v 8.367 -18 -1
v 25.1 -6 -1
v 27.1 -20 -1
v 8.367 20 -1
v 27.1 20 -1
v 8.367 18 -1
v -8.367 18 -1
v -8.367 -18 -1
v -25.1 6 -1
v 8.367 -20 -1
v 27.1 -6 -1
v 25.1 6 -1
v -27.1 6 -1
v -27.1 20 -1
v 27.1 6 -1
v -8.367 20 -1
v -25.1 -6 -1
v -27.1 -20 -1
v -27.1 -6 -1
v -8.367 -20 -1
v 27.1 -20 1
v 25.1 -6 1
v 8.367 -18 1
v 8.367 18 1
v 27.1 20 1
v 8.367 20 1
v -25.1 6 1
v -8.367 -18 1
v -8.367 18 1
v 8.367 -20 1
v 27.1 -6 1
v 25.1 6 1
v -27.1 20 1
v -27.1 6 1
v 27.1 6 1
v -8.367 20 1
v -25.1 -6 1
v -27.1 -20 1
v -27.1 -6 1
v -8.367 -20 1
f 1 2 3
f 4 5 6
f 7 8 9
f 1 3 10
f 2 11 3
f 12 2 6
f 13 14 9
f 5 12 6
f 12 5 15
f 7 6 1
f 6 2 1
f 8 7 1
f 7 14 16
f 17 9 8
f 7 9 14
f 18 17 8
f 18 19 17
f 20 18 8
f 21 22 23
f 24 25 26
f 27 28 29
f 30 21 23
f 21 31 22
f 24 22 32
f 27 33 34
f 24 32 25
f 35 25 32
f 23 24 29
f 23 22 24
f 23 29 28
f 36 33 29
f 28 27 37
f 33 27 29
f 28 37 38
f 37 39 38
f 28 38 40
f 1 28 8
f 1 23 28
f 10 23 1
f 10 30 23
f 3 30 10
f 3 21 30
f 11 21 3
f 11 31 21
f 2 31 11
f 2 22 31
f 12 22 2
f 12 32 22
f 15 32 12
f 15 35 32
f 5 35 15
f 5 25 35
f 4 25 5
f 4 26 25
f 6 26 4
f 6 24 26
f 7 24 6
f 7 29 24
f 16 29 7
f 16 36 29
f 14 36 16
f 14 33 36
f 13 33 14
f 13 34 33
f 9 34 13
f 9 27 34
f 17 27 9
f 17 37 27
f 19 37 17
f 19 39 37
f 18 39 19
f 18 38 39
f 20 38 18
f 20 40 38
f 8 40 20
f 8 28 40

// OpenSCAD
// file: ../lib/side.scad
module side_top_bottom(inner_x,inner_y,width) {
  x = inner_x/2;
  y = inner_y/2;

  polygon(points=[
      [-x-width,-y-width],
      [-x*1/3,-y-width],
      [-x*1/3,-y],
      [x*1/3,-y],
      [x*1/3,-y-width],
      [x+width,-y-width],
      [x+width,-y*1/3],
      [x,-y*1/3],
      [x,y*1/3],
      [x+width,y*1/3],
      [x+width,y+width],
      [x*1/3,y+width],
      [x*1/3,y],
      [-x*1/3,y],
      [-x*1/3,y+width],
      [-x-width,y+width],
      [-x-width,y*1/3],
      [-x,y*1/3],
      [-x,-y*1/3],
      [-x-width,-y*1/3],
    ],convexity=10);
}

module side_left_right(inner_x,inner_z,width) {
  x = inner_x/2;
  z = inner_z/2;

  polygon(points=[
      [-x-width,-z],
      [-x*1/3,-z],
      [-x*1/3,-z-width],
      [x*1/3,-z-width],
      [x*1/3,-z],
      [x+width,-z],
      [x+width,-z*1/3],
      [x,-z*1/3],
      [x,z*1/3],
      [x+width,z*1/3],
      [x+width,z],
      [x*1/3,z],
      [x*1/3,z+width],
      [-x*1/3,z+width],
      [-x*1/3,z],
      [-x-width,z],
      [-x-width,z*1/3],
      [-x,z*1/3],
      [-x,-z*1/3],
      [-x-width,-z*1/3],
    ],convexity=10);
}


module side_front_back(inner_y,inner_z,width) {
  y = inner_y/2;
  z = inner_z/2;

  polygon(points=[
      [-y,-z],
      [-y*1/3,-z],
      [-y*1/3,-z-width],
      [y*1/3,-z-width],
      [y*1/3,-z],
      [y,-z],
      [y,-z*1/3],
      [y+width,-z*1/3],
      [y+width,z*1/3],
      [y,z*1/3],
      [y,z],
      [y*1/3,z],
      [y*1/3,z+width],
      [-y*1/3,z+width],
      [-y*1/3,z],
      [-y,z],
      [-y,z*1/3],
      [-y-width,z*1/3],
      [-y-width,-z*1/3],
      [-y,-z*1/3],
    ],convexity=10);
}
// file: top.2d.scad
use <../lib/side.scad>;

module top() {
  side_top_bottom(50.2,36,2);
}

top();
// main file
use <top.2d.scad>;

linear_extrude(height = 2, center = true, convexity = 10, twist = 0) {
  top();
}
